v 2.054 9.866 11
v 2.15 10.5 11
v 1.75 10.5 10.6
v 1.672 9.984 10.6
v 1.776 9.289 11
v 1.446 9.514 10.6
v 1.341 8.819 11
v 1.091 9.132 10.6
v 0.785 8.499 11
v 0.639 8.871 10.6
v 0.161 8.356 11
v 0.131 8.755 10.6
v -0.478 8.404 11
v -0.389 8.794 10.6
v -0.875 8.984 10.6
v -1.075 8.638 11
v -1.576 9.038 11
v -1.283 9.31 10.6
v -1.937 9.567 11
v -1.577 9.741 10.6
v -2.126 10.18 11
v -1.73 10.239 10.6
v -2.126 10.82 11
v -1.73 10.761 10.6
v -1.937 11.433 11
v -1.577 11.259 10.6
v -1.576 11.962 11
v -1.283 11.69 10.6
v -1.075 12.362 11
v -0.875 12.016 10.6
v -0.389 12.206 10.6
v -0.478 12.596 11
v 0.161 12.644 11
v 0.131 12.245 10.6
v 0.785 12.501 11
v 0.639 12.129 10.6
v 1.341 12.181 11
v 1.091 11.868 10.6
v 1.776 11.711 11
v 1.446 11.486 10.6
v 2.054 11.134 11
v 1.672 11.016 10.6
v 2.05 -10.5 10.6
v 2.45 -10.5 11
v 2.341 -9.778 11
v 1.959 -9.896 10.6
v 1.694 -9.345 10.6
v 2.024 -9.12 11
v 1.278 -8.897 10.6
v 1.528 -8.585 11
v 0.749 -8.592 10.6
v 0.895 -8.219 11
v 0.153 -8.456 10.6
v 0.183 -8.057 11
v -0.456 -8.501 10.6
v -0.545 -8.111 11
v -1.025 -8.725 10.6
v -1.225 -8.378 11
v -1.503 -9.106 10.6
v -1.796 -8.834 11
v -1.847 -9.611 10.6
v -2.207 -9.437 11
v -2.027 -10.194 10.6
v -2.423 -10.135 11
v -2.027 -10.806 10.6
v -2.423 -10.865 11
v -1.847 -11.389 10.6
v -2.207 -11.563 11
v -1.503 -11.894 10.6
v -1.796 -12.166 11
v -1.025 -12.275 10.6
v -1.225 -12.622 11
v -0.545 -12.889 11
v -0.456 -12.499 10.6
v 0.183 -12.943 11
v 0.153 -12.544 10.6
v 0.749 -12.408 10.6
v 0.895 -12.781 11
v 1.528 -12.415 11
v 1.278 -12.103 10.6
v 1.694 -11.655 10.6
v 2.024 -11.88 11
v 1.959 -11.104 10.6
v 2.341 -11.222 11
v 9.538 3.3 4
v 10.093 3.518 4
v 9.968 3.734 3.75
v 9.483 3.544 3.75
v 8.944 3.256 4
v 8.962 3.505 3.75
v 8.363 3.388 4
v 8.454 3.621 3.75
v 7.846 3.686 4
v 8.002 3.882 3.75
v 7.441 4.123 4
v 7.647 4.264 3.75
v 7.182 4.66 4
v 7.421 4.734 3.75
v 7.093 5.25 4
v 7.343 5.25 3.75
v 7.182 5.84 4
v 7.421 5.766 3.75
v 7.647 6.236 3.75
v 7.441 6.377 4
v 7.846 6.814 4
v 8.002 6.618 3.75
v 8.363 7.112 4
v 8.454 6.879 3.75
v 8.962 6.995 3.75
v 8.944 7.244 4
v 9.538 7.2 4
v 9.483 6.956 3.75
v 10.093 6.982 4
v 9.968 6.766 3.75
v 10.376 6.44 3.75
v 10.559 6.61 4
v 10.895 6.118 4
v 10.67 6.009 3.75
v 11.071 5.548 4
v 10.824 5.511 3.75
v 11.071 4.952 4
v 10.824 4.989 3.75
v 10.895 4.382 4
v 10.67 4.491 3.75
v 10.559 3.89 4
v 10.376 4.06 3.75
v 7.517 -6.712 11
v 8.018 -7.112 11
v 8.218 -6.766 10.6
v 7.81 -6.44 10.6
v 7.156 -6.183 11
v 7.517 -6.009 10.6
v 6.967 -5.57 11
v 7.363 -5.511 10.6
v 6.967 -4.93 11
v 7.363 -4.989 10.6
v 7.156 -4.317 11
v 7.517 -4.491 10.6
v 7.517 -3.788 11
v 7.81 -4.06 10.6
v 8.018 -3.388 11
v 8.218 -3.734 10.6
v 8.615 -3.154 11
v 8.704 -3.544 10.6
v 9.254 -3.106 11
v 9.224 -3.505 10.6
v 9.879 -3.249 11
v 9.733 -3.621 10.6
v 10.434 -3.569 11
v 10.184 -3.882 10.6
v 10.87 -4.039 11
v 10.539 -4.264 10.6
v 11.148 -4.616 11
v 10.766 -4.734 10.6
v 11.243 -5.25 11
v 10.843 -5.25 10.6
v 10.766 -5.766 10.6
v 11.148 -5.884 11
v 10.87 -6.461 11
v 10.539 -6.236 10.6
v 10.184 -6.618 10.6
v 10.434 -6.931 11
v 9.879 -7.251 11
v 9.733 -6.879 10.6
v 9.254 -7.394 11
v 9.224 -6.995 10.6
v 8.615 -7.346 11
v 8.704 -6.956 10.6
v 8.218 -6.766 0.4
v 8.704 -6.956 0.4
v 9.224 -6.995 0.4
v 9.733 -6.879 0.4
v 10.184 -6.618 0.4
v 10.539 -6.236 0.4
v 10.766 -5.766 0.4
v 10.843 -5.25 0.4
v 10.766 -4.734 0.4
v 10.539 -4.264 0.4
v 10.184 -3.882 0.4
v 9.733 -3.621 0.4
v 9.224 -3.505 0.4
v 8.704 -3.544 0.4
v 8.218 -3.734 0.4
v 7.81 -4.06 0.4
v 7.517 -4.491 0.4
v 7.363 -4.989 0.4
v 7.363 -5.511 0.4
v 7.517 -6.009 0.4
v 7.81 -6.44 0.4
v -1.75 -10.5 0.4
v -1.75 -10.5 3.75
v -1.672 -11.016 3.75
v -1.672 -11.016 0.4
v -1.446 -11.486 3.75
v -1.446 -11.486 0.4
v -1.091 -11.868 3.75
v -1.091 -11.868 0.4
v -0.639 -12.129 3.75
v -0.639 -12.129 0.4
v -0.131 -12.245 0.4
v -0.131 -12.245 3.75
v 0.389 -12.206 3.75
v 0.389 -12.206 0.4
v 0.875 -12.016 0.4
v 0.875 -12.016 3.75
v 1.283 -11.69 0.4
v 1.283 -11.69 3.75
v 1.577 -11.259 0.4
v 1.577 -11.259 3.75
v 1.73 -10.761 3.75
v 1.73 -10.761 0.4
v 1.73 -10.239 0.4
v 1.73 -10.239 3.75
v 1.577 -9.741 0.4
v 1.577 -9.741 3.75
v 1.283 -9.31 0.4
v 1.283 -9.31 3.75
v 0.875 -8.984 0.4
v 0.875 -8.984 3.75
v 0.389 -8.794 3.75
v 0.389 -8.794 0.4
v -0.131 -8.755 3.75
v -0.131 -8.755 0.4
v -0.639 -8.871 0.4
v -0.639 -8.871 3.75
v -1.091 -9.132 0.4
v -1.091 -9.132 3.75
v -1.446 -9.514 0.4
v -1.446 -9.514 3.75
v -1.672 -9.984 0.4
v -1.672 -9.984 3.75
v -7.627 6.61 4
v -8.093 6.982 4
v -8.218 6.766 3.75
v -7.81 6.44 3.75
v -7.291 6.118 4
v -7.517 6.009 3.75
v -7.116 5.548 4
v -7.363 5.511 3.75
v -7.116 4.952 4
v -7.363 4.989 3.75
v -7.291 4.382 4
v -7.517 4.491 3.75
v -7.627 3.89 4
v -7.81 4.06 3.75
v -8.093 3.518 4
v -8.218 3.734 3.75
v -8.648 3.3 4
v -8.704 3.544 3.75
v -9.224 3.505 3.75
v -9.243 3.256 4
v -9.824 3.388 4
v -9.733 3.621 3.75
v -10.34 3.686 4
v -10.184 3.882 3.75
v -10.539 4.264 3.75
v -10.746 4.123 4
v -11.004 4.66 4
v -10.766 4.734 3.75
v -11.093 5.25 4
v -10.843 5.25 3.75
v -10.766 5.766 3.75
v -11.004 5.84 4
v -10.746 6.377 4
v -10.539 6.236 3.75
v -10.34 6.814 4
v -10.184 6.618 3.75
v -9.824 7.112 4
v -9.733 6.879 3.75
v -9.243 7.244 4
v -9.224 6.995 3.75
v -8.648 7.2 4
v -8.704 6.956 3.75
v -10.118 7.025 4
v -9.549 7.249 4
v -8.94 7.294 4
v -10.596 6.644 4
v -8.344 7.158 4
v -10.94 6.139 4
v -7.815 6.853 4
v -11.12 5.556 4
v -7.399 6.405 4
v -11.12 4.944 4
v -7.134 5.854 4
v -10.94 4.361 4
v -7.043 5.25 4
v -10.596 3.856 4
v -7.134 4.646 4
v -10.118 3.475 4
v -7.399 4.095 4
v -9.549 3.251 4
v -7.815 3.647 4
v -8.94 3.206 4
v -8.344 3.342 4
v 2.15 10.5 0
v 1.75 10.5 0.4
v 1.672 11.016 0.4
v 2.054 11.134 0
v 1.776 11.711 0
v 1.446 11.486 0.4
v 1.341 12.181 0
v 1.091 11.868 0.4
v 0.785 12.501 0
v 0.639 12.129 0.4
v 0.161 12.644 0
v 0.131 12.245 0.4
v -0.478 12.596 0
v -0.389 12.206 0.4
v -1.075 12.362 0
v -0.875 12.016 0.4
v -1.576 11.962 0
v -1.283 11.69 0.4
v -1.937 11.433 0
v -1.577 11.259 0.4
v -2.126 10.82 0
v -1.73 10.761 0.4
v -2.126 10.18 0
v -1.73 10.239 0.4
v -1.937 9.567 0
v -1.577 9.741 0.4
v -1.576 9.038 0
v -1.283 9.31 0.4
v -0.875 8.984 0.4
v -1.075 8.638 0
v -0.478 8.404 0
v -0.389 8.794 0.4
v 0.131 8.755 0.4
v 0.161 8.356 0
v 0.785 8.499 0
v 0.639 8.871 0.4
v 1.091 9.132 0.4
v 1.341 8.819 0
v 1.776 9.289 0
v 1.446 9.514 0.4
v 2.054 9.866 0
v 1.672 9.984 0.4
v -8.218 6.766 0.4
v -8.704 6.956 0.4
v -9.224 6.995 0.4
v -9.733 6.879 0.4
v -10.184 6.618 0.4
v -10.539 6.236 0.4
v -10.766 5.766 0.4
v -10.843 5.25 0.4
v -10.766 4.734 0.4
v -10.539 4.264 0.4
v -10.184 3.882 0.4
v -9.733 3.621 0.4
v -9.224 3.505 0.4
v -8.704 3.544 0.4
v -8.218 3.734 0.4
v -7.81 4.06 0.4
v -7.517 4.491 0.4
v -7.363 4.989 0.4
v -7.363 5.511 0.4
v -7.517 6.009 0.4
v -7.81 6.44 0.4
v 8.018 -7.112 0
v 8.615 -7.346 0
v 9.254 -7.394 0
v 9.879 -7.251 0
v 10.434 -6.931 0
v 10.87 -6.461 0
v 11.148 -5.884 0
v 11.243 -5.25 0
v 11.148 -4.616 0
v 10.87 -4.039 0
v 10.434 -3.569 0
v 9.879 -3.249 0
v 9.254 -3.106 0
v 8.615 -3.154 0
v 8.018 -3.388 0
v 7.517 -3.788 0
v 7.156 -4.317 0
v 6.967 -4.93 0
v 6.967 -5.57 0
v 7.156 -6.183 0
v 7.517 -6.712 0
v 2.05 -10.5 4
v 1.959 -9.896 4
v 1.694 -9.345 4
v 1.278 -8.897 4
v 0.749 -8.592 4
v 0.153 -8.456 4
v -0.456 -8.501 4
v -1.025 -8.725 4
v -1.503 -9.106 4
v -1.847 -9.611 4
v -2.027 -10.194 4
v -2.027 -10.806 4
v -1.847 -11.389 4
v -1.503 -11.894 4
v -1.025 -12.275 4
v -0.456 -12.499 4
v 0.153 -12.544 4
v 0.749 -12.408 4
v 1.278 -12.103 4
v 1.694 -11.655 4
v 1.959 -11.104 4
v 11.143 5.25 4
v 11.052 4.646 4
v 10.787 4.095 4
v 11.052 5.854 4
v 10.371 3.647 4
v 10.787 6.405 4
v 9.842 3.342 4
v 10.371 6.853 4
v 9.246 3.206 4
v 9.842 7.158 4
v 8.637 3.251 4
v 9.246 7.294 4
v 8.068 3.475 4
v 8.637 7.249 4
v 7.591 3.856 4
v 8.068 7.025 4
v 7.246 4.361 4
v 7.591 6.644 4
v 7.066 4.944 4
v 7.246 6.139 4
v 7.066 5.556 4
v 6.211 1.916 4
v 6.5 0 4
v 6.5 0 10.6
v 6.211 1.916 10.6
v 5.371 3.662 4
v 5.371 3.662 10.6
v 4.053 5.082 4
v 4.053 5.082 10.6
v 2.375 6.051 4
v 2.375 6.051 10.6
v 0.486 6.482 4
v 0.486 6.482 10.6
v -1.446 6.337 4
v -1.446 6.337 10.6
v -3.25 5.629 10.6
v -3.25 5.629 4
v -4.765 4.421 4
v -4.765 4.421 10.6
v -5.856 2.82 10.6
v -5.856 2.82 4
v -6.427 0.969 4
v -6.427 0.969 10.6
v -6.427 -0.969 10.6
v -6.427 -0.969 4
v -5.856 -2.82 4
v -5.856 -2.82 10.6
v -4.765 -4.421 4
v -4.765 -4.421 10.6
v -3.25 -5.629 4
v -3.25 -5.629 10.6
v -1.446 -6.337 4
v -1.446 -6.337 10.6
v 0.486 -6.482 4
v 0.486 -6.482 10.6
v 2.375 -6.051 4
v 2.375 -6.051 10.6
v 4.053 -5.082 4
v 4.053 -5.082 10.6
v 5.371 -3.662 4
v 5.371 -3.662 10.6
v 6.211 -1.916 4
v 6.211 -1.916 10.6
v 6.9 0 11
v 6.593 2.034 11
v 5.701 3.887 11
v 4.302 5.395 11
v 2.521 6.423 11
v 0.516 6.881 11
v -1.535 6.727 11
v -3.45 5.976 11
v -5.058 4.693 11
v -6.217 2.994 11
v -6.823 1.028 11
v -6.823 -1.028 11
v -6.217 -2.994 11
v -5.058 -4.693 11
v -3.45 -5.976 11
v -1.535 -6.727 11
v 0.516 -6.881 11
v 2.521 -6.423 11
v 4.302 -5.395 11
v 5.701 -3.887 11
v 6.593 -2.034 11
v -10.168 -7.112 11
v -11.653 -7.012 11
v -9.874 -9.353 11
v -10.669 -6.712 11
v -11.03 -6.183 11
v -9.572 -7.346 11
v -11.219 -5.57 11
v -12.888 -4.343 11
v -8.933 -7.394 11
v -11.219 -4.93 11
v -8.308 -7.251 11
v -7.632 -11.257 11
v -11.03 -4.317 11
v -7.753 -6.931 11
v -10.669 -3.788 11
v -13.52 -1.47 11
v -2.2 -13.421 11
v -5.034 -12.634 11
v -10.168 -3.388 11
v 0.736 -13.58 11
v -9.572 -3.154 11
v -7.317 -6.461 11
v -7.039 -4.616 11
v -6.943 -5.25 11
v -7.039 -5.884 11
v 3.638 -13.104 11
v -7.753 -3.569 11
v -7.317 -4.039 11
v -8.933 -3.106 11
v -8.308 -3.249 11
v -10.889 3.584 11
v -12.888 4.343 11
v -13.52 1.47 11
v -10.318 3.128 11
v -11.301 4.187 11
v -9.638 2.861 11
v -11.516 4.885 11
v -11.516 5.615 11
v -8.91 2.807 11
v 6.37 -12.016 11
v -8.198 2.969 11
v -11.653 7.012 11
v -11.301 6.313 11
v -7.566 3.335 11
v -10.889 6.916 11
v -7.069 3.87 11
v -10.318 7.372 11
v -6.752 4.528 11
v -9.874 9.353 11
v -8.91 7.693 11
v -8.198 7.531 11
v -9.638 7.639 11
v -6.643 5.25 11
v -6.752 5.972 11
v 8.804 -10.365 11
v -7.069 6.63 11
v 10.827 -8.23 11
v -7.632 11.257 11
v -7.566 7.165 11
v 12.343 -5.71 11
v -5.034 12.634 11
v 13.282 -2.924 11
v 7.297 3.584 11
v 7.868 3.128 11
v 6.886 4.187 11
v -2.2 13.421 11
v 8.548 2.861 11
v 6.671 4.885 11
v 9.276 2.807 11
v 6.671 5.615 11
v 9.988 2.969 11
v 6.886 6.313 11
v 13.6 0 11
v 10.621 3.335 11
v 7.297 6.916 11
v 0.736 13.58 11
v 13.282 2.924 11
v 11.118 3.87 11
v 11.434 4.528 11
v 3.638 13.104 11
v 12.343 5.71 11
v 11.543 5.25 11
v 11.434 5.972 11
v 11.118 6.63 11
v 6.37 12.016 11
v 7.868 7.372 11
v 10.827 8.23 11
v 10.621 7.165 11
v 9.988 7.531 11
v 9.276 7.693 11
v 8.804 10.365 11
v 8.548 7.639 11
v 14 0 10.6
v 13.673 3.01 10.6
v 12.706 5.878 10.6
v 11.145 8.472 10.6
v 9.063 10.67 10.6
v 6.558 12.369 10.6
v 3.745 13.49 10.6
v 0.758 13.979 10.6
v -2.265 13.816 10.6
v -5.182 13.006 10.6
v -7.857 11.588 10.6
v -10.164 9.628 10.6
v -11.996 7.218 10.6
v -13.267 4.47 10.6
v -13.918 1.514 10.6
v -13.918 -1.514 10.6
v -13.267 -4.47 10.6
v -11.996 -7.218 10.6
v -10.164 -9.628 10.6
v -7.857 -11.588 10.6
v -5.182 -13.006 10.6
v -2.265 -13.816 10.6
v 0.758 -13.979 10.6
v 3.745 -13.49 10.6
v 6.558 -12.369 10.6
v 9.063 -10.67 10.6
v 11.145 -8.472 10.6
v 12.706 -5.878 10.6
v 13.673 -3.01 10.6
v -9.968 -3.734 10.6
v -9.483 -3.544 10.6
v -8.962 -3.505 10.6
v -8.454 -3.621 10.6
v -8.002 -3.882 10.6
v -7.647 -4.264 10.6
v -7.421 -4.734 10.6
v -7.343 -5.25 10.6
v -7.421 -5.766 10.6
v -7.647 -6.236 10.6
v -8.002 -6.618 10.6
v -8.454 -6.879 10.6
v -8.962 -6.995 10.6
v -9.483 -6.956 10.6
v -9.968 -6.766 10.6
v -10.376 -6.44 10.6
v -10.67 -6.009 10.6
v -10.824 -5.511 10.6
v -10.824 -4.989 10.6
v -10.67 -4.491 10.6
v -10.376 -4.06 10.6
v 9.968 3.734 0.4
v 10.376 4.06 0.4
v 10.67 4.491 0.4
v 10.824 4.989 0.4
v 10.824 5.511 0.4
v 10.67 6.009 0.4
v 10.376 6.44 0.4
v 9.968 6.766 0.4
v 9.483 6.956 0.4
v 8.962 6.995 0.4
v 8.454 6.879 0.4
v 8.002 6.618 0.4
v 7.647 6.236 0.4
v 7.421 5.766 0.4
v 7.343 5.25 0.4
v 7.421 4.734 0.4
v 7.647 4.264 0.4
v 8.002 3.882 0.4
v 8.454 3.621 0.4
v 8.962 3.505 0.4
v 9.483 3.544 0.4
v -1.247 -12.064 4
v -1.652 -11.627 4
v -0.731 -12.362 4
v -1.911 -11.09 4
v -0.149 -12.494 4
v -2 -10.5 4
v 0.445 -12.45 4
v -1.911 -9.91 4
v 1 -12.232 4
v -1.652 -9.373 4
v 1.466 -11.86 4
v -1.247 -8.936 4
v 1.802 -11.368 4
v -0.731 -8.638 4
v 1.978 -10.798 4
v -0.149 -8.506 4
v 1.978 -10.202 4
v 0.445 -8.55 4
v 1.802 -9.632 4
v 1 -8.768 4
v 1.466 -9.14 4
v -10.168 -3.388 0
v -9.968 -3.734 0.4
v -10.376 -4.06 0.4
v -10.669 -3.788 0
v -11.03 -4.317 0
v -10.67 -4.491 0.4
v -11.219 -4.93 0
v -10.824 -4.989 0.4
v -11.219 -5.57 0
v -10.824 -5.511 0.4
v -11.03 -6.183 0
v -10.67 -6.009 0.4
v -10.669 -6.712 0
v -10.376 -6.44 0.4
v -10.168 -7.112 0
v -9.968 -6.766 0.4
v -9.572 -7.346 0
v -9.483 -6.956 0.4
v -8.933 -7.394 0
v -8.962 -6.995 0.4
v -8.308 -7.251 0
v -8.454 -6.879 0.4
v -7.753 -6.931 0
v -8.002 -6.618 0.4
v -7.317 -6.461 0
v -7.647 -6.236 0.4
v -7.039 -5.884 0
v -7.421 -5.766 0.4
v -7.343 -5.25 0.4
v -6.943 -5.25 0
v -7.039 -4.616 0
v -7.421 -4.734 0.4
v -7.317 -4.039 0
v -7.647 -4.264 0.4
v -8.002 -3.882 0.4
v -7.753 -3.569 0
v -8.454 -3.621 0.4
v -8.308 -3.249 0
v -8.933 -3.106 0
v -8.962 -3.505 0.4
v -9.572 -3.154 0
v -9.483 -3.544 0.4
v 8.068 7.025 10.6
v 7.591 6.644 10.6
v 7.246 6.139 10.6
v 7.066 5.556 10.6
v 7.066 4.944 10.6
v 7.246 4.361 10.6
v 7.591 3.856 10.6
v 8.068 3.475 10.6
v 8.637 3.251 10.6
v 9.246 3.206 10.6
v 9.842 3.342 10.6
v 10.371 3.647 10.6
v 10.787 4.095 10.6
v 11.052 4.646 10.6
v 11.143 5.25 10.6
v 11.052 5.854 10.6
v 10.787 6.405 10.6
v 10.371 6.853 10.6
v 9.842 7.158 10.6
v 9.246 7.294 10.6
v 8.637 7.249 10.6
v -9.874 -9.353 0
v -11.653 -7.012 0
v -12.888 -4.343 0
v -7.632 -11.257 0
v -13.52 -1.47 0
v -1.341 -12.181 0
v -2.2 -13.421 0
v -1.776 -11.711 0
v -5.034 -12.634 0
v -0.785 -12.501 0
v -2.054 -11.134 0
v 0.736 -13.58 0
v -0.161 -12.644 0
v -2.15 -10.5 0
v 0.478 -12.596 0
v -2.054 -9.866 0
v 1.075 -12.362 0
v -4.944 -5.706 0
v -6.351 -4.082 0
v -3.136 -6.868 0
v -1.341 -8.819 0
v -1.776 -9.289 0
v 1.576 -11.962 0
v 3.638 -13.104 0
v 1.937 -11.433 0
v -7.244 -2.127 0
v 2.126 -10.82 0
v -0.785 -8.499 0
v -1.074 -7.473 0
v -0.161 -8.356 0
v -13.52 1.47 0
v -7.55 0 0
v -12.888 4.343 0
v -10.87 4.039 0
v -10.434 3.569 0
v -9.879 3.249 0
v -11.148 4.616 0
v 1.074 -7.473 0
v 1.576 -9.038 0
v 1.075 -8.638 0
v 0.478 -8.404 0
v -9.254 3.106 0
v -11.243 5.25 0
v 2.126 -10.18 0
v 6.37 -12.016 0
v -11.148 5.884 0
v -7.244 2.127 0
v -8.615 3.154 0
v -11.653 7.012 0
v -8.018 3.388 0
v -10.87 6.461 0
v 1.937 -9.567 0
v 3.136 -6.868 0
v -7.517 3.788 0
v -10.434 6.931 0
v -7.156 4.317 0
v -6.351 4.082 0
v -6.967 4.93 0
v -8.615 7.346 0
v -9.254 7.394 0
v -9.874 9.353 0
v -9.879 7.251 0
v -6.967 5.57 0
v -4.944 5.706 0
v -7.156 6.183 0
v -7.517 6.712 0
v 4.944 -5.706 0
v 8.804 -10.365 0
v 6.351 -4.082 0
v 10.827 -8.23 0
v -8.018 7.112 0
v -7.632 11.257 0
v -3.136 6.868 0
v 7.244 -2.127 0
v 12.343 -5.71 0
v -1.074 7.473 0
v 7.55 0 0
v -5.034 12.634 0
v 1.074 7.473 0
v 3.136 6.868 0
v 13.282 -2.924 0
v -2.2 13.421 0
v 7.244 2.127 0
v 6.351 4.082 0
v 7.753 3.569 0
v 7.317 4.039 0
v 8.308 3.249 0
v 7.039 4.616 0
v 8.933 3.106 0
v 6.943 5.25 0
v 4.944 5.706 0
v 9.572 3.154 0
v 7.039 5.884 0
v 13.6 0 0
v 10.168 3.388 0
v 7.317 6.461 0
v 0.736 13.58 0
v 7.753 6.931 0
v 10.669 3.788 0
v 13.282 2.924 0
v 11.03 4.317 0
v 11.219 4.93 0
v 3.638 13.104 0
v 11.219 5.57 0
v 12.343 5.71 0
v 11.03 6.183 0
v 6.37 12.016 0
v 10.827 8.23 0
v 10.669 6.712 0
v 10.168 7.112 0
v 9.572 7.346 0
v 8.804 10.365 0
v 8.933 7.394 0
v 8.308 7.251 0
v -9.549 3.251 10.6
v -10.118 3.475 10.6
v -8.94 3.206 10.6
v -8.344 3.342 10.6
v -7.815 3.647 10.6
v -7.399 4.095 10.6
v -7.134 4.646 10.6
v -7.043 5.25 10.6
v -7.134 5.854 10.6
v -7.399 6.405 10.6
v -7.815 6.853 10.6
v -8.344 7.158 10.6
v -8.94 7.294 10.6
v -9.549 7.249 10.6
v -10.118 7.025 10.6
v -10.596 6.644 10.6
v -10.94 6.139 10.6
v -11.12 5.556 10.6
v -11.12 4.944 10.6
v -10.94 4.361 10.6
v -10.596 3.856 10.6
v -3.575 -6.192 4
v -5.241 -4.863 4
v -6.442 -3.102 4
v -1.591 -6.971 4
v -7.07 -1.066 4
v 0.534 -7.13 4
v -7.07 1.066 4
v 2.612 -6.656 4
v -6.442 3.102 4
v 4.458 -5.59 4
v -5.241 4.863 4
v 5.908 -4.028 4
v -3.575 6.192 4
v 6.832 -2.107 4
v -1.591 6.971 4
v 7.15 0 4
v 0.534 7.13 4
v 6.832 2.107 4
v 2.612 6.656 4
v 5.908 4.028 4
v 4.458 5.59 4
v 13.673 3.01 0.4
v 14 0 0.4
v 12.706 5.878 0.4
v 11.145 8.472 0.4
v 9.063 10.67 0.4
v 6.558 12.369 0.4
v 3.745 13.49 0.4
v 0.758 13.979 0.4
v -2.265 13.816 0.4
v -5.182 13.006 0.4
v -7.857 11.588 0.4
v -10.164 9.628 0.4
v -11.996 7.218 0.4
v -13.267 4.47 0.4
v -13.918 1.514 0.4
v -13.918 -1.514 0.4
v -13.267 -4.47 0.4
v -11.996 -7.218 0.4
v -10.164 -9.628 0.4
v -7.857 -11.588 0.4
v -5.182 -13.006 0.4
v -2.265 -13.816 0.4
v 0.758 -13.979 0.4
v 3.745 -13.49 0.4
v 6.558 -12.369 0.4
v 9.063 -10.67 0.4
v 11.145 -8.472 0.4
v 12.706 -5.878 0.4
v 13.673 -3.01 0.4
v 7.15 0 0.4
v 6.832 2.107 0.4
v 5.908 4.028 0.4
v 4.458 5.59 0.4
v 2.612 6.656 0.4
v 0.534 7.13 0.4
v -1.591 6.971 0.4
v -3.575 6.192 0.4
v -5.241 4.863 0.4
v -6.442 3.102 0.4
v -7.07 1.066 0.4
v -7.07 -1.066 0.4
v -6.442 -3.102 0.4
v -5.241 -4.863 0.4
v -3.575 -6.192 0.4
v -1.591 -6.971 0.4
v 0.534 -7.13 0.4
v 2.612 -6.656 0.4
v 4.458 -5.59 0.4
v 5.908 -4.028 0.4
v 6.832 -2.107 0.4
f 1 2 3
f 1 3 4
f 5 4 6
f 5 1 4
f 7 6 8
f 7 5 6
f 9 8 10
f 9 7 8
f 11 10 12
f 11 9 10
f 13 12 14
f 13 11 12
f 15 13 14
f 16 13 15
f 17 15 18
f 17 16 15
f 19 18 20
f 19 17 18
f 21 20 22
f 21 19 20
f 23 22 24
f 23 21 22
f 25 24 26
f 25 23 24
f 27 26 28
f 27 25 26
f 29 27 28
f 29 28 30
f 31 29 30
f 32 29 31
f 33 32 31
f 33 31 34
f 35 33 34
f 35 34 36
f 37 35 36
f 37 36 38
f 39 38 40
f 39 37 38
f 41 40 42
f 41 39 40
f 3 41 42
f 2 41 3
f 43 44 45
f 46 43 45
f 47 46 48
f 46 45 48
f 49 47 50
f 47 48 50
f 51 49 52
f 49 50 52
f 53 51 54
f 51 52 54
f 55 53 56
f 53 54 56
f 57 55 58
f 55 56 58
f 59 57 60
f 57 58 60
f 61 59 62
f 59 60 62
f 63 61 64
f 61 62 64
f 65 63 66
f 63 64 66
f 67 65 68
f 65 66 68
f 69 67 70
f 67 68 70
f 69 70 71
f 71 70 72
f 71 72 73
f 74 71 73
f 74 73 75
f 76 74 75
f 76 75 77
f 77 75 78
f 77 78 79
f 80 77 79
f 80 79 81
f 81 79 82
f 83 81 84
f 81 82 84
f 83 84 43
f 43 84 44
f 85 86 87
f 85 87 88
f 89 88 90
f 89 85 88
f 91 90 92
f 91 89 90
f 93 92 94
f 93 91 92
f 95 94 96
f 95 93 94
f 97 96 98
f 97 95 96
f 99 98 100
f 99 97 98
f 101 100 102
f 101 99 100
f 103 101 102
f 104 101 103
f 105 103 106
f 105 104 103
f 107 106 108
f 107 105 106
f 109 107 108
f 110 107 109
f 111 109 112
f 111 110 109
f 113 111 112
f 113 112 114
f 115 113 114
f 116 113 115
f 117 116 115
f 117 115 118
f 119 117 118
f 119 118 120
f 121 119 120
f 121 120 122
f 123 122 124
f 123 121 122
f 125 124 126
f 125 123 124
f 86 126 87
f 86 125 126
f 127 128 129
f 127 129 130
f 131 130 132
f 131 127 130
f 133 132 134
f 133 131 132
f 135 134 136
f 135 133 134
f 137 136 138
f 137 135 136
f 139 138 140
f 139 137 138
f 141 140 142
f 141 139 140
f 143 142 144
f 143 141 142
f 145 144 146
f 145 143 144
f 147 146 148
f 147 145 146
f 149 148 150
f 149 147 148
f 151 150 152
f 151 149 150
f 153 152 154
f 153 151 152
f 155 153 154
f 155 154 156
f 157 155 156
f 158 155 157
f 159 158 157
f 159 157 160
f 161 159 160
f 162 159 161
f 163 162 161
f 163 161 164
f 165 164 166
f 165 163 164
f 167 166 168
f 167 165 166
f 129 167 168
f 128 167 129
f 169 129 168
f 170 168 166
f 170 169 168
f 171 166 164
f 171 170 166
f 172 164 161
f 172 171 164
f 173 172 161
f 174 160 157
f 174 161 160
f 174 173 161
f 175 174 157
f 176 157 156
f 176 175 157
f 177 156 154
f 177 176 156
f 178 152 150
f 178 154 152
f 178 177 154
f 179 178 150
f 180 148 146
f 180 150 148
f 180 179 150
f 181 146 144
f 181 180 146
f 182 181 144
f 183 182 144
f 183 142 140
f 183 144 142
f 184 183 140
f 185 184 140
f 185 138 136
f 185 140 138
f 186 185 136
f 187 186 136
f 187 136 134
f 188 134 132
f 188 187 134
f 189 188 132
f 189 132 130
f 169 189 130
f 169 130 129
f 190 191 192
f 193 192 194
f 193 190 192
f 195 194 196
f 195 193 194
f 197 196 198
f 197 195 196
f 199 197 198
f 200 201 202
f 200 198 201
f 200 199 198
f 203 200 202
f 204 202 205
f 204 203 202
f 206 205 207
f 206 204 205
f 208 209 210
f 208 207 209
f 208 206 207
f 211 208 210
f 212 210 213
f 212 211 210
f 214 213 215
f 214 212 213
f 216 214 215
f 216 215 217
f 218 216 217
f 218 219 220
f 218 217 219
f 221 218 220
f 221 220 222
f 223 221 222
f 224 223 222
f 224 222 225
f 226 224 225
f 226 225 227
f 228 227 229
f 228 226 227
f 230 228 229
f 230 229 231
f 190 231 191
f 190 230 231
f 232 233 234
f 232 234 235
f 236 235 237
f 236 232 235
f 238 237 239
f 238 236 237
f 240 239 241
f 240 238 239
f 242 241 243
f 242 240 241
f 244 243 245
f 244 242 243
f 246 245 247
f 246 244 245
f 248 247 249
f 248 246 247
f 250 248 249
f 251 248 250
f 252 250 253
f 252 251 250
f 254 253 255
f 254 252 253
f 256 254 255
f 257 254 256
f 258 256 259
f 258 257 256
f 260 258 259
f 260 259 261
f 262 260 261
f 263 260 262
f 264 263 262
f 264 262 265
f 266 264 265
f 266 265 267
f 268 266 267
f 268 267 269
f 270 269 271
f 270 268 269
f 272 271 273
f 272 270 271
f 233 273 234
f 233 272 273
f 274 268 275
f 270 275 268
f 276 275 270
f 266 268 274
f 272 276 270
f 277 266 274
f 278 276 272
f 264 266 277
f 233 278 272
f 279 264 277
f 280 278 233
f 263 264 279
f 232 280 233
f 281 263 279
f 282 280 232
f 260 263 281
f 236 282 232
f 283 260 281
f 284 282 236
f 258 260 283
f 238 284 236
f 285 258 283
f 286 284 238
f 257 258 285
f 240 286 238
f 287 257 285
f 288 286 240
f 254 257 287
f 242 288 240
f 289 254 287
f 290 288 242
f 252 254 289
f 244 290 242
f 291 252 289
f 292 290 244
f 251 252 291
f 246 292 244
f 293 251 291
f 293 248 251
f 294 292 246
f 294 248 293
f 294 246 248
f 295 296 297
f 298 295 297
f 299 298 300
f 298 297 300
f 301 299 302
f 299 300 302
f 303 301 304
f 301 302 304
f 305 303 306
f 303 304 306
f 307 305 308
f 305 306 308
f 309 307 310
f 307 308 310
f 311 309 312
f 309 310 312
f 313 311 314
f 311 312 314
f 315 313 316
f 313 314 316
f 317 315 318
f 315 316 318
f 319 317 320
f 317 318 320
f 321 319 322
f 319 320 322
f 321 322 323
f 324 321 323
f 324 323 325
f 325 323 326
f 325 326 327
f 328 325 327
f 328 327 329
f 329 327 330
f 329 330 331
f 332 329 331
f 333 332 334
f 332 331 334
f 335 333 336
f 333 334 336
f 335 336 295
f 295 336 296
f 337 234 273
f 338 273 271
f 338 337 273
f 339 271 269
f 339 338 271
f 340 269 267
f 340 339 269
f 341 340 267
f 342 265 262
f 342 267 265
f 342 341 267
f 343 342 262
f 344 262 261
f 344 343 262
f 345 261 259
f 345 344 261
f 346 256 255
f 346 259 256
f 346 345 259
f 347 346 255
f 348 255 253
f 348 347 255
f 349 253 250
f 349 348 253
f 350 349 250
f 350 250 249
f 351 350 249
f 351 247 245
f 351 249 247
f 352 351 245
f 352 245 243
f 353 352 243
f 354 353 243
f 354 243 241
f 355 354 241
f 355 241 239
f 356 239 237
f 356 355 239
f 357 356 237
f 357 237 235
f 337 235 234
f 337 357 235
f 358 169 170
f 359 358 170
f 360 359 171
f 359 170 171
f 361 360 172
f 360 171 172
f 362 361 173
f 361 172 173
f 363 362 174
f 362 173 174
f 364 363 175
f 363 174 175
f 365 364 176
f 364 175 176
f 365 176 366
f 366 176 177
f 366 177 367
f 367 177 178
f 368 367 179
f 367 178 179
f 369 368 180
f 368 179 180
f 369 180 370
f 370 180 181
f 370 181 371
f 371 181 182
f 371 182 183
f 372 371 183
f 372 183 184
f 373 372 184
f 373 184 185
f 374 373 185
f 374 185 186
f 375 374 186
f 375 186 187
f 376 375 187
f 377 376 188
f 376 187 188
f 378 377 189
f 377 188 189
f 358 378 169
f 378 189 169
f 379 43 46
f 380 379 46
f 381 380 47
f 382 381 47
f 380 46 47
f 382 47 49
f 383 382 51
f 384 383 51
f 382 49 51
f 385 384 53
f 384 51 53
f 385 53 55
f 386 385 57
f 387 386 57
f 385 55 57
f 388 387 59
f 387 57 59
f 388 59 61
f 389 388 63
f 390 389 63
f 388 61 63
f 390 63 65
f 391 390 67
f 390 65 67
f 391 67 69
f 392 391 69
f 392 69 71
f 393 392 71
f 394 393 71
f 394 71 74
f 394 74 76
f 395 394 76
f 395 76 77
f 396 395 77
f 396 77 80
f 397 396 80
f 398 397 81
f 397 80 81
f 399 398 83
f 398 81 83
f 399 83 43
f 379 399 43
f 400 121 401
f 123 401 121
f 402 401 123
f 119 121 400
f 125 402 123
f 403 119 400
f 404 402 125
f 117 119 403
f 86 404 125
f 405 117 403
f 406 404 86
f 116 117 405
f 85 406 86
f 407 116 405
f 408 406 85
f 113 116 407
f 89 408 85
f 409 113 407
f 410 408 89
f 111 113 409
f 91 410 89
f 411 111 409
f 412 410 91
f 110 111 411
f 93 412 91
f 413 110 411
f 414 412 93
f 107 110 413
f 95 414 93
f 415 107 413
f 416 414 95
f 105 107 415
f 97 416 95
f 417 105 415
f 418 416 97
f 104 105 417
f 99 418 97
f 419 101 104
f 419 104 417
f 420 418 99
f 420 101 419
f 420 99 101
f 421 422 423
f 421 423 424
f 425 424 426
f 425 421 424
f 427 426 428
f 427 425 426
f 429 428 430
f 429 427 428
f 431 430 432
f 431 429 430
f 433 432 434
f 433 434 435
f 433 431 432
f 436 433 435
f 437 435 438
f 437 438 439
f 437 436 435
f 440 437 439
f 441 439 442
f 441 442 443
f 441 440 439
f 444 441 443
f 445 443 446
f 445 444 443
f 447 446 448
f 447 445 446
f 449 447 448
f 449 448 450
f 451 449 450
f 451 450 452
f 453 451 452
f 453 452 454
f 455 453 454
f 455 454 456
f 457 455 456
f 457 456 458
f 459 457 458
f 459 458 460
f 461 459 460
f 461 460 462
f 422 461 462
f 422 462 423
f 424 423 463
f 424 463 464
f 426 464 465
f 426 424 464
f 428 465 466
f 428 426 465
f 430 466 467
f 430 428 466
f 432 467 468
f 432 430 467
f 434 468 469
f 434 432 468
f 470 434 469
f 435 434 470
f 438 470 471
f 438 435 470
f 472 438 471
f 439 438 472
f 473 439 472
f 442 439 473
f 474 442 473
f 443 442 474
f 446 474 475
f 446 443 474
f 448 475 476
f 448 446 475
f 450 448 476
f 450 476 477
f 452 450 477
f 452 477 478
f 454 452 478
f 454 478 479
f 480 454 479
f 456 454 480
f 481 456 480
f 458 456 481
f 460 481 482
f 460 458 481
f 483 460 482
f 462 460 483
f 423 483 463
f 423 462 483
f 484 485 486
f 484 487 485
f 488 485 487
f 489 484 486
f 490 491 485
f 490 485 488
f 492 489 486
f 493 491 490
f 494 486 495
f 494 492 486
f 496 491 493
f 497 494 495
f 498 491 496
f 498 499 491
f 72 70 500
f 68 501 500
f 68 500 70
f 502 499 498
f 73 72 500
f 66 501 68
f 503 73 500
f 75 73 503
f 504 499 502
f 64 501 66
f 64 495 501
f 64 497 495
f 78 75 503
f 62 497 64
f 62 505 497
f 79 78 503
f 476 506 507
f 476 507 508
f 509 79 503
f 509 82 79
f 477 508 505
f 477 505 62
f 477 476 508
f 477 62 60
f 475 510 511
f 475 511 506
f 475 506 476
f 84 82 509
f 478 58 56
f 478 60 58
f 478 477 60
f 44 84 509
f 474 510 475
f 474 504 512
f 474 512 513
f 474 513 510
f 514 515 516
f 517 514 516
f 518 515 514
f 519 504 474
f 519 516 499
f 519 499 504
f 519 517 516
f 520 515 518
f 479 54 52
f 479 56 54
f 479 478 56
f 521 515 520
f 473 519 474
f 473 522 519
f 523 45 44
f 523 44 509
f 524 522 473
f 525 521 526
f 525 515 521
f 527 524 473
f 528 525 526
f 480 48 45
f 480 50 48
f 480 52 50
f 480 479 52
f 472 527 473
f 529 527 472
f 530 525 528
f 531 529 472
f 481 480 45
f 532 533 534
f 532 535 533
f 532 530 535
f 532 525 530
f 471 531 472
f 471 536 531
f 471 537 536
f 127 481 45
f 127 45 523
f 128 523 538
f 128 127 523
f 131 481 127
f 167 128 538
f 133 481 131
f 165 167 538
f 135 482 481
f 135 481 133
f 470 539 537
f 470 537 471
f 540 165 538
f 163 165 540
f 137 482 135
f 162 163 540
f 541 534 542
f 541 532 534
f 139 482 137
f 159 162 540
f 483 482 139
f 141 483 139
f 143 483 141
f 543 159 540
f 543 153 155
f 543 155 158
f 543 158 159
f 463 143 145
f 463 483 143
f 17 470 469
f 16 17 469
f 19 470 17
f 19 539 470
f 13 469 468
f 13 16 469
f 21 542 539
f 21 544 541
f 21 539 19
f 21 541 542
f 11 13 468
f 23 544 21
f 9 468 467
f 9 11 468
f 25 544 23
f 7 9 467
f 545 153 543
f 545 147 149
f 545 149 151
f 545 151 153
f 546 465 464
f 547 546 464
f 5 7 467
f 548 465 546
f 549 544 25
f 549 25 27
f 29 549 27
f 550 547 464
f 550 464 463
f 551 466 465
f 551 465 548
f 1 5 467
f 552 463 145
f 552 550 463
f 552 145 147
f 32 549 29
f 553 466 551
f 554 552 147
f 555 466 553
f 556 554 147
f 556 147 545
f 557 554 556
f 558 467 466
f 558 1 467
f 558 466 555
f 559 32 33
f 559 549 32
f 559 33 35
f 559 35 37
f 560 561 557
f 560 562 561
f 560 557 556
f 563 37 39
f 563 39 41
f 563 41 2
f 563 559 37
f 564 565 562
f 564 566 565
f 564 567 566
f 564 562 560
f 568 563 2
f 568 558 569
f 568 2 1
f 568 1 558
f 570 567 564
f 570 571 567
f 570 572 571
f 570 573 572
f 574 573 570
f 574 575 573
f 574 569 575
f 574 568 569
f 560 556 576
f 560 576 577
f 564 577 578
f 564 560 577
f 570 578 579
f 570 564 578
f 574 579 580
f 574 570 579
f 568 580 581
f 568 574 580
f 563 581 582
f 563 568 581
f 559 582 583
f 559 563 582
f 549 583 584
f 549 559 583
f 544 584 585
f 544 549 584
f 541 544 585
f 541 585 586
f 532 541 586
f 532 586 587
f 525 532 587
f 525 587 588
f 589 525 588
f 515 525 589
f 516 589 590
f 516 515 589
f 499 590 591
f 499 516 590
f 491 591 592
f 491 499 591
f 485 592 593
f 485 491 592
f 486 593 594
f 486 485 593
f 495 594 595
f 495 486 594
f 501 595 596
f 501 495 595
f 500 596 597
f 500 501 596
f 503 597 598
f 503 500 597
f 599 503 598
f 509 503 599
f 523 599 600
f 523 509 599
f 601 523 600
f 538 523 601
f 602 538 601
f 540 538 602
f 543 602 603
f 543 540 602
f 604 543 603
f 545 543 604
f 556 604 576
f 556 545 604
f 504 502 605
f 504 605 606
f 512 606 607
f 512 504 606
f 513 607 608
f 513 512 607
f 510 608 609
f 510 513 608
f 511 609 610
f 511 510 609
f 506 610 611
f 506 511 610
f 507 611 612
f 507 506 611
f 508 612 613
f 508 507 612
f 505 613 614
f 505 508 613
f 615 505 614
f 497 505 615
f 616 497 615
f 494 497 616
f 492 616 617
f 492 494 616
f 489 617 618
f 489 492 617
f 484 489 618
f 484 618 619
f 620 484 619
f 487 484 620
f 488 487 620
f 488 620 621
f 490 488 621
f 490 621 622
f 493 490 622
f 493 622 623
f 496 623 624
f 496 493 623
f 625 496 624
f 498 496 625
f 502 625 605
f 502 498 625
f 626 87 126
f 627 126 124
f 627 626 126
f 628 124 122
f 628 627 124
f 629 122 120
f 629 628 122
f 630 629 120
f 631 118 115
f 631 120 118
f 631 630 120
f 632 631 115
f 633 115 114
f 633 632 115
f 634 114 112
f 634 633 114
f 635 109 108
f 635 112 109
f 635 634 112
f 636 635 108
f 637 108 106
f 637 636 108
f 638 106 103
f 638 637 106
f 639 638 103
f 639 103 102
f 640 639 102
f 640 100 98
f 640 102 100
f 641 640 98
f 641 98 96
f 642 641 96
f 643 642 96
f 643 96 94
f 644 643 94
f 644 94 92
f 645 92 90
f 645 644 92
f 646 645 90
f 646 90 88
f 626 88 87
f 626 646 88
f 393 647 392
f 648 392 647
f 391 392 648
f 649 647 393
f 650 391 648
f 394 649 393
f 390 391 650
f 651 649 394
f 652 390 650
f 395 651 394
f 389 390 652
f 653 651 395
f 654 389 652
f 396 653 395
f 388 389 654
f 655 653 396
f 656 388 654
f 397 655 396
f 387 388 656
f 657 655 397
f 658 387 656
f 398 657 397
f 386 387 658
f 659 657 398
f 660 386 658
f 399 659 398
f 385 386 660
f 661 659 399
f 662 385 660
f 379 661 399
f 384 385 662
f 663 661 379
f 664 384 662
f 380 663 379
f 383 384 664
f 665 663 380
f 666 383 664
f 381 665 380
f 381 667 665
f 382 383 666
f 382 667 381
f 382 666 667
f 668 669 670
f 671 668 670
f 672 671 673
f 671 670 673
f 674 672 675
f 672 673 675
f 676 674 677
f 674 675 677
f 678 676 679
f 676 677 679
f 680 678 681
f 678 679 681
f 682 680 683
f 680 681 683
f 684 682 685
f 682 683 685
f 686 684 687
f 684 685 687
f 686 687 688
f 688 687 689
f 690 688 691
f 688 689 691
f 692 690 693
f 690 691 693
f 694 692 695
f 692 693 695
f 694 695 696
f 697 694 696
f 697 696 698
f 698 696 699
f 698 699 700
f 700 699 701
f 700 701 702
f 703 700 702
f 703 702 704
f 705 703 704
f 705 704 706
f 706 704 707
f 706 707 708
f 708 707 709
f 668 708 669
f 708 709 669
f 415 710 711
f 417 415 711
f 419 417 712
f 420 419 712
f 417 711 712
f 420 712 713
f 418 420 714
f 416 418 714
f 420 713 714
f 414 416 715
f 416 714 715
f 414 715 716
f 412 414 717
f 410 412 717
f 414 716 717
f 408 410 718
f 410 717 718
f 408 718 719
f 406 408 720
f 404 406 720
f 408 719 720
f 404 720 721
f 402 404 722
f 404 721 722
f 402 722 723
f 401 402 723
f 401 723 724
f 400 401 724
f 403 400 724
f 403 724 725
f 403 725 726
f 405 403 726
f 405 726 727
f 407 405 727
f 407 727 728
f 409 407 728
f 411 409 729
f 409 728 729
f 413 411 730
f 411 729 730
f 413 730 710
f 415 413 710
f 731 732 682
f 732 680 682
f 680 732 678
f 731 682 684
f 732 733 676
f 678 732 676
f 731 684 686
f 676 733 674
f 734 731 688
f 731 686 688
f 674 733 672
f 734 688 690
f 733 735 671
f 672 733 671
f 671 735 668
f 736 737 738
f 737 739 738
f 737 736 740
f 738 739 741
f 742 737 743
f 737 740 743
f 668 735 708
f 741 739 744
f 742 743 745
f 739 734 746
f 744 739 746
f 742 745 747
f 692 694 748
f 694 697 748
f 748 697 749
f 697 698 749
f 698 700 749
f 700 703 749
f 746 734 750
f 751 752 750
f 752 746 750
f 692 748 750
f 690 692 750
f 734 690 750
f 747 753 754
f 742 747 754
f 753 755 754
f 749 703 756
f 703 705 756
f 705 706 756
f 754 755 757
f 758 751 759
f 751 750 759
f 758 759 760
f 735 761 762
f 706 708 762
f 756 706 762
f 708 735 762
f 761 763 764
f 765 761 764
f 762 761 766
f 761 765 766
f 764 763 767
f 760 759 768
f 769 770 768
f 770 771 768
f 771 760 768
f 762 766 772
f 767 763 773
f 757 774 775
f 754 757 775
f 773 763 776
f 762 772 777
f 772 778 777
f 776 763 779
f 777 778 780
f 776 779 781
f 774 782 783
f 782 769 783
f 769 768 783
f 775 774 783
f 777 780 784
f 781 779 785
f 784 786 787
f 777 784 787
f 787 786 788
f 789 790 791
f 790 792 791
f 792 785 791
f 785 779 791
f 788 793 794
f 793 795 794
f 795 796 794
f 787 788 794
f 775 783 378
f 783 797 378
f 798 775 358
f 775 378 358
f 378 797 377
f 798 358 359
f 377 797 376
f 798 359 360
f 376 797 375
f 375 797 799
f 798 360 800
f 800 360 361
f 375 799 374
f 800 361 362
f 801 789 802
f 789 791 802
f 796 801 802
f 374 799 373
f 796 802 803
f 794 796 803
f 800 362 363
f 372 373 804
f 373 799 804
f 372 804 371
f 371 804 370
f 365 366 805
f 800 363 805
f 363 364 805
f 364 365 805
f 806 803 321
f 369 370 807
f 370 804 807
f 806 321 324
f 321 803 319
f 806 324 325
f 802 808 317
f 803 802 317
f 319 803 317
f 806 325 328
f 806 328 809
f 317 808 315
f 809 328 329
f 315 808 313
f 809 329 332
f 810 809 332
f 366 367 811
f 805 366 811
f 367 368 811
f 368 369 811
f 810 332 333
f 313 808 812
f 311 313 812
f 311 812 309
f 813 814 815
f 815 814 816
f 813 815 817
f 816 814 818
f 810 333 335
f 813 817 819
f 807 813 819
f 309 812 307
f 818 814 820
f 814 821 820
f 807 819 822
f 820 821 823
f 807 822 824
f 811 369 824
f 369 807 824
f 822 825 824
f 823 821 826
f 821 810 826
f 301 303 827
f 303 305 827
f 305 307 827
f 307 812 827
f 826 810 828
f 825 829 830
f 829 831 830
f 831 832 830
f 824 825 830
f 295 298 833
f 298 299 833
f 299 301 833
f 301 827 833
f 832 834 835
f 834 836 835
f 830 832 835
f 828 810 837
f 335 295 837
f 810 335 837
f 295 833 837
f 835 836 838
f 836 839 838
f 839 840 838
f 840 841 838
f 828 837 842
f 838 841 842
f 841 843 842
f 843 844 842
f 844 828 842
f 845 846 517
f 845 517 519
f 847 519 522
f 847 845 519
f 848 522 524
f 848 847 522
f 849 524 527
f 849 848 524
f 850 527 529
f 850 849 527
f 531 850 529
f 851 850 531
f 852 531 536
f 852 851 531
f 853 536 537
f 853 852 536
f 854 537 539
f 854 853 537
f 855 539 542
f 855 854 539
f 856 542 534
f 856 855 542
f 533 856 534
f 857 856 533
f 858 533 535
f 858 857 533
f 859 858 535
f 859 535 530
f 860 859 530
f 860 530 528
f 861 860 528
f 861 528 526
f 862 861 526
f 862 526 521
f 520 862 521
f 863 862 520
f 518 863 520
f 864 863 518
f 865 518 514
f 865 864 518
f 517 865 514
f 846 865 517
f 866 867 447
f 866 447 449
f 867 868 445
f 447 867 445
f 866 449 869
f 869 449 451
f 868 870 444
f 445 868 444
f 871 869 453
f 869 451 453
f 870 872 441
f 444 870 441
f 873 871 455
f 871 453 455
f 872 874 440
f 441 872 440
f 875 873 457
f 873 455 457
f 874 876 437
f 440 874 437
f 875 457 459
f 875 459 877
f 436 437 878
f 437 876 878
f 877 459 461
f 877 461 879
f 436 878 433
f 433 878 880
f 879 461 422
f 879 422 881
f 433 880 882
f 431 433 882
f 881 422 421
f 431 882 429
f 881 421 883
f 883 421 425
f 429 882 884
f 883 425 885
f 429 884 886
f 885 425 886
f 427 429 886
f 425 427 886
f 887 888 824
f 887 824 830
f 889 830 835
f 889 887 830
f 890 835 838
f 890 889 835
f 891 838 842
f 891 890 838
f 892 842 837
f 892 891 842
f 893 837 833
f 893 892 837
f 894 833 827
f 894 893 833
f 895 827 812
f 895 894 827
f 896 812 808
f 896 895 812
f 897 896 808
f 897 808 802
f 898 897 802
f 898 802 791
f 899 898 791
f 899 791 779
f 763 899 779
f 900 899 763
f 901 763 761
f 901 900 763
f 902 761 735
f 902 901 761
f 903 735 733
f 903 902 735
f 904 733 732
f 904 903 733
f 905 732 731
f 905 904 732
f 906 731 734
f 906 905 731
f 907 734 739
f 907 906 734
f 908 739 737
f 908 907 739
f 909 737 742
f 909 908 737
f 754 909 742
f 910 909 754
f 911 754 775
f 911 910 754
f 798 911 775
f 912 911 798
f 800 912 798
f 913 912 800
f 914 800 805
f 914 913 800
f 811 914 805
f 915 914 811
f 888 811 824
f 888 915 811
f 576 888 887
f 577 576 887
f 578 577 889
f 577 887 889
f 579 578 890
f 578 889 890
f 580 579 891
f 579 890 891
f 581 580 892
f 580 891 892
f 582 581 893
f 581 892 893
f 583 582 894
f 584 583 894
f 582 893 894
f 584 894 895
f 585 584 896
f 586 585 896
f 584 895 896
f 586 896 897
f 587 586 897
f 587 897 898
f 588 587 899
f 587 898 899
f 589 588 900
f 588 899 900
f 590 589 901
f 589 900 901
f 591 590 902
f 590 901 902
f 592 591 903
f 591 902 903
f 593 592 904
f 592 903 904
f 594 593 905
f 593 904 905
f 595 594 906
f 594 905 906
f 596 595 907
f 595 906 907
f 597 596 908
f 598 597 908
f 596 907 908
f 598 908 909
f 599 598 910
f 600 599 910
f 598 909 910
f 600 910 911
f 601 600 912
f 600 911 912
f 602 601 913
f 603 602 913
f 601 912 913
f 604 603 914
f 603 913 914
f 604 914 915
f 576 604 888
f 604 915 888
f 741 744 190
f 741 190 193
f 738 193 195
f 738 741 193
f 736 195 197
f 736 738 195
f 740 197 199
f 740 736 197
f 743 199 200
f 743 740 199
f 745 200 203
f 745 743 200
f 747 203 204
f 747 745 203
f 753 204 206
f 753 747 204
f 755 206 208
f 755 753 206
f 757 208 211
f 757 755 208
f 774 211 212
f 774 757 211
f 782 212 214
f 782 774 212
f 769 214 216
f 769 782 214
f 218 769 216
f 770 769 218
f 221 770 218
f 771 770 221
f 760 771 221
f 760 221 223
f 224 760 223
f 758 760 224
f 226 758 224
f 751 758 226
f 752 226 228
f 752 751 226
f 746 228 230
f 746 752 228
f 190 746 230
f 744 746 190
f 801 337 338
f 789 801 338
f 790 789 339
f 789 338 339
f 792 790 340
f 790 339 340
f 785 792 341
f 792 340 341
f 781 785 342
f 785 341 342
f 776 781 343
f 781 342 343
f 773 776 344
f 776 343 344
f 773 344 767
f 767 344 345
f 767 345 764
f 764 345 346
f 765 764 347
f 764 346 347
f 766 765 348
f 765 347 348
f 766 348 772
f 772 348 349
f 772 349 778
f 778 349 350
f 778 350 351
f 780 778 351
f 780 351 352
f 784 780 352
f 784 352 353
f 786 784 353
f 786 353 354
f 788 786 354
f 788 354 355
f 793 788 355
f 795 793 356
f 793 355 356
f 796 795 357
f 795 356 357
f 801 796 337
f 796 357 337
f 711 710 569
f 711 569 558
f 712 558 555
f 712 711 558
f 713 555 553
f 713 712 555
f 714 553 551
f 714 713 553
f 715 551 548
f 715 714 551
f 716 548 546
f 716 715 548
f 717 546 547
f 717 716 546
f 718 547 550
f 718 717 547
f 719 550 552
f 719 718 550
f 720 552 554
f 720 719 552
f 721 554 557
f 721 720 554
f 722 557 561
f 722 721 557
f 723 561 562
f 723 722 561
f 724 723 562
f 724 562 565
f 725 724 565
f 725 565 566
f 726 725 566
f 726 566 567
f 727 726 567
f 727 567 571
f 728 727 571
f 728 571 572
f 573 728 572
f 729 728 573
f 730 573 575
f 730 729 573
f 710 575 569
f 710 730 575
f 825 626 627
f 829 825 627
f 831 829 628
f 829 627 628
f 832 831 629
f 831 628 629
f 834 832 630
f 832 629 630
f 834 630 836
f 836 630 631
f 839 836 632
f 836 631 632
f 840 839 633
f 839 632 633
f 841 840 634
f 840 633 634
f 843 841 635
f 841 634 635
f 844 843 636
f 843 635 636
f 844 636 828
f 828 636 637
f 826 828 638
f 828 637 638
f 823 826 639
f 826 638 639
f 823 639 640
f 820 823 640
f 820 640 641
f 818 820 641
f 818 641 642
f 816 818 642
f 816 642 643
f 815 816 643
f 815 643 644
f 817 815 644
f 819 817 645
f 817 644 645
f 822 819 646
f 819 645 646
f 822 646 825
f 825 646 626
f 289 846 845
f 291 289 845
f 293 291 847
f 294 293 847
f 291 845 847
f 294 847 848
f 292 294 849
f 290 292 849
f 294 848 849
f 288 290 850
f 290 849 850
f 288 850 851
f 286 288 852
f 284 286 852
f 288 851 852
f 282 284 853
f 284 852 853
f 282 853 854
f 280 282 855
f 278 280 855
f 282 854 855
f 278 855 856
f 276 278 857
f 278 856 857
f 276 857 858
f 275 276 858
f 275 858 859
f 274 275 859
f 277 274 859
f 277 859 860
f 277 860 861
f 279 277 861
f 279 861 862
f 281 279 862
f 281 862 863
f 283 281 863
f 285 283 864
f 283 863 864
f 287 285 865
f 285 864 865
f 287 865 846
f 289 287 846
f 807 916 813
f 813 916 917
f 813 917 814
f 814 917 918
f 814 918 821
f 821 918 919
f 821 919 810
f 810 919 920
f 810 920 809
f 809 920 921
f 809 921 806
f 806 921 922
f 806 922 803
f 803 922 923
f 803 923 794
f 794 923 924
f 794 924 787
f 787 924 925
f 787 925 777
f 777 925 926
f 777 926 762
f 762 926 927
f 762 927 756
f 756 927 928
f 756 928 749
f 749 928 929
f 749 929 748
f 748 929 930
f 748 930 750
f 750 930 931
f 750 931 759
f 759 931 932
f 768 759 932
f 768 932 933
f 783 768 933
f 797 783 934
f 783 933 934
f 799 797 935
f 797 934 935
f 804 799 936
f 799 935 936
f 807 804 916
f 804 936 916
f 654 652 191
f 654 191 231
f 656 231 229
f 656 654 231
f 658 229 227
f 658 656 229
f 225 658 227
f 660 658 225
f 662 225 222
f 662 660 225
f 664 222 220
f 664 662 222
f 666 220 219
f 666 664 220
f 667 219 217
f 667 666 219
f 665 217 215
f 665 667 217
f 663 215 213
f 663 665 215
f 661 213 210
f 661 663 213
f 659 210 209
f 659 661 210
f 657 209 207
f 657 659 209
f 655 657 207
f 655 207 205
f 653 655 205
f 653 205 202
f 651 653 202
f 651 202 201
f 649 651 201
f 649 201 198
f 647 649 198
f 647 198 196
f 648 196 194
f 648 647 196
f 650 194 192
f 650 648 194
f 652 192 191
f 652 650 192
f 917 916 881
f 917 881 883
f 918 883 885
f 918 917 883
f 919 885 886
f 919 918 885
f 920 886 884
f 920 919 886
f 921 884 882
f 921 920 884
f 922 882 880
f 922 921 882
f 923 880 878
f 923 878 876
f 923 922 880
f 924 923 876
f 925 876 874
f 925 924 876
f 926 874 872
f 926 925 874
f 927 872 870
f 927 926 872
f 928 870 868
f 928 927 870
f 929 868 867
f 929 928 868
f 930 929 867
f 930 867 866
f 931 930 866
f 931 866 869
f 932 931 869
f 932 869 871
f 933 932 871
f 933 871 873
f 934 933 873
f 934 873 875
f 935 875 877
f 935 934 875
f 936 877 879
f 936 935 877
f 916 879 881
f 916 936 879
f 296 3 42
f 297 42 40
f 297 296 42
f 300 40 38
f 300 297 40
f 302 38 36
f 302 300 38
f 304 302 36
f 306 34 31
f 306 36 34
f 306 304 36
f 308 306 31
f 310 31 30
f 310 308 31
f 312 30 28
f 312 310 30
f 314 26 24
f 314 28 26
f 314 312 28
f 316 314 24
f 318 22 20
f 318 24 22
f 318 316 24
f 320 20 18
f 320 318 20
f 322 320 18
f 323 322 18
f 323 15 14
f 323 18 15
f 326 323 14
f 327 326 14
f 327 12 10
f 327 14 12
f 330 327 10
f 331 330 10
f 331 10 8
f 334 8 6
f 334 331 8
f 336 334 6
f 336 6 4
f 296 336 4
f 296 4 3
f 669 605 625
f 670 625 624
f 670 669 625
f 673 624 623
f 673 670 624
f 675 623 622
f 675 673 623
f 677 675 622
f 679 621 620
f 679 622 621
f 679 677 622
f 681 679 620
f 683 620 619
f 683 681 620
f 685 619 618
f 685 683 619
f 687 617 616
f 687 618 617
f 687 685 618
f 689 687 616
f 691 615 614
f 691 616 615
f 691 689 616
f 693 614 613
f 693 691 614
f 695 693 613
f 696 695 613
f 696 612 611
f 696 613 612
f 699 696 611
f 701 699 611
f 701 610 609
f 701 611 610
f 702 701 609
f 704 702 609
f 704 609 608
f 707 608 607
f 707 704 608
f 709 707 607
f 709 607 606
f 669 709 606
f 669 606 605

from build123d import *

# Parameters (mm, degrees)
SKETCH101_R           = 14
SKETCH101_R_2         = 6.5
PAD060_DEPTH          = 11
SKETCH102_R           = 7.15
POCKET039_DEPTH       = 4
SKETCH103_R           = 1.75
POCKET040_DEPTH       = 93.19589
POLARPATTERN021_COUNT = 6
SKETCH104_R           = 2.05
POCKET041_DEPTH       = 7
POLARPATTERN022_COUNT = 3
CHAMFER037_SIZE       = 0.25
CHAMFER036_SIZE       = 0.4


with BuildPart() as part:
    # Sketch101 → Pad060 (new body)
    with BuildSketch(Plane.XY):
        Circle(SKETCH101_R)
        Circle(SKETCH101_R_2, mode=Mode.SUBTRACT)
    extrude(amount=PAD060_DEPTH)

    # Sketch102 → Pocket039 (cut)
    with BuildSketch(Plane.XY):
        Circle(SKETCH102_R)
    extrude(amount=POCKET039_DEPTH, mode=Mode.SUBTRACT)

    # Sketch103 → Pocket040 (cut, through all)
    with BuildSketch(Plane.XY):
        with Locations((0, 10.5)):
            Circle(SKETCH103_R)
    pocket040 = extrude(amount=POCKET040_DEPTH, mode=Mode.SUBTRACT)

    # PolarPattern021: Pocket040 ×6 about axis
    polarpattern021_axis = Axis((0, 0, 0), (0, 0, 1))
    for i in range(1, POLARPATTERN021_COUNT):
        add(pocket040.rotate(polarpattern021_axis, i * 360 / POLARPATTERN021_COUNT), mode=Mode.SUBTRACT)

    # Sketch104 (on Plane of DatumPlane006) → Pocket041 (cut)
    with BuildSketch(Plane.XY.offset(11)):
        with Locations((0, -10.5)):
            Circle(SKETCH104_R)
    pocket041 = extrude(amount=-POCKET041_DEPTH, mode=Mode.SUBTRACT)

    # PolarPattern022: Pocket041 ×3 about axis
    polarpattern022_axis = Axis((0, 0, 11), (0, 0, 1))
    for i in range(1, POLARPATTERN022_COUNT):
        add(pocket041.rotate(polarpattern022_axis, i * 360 / POLARPATTERN022_COUNT), mode=Mode.SUBTRACT)

    # Chamfer037
    chamfer037_edges = [part.edges().sort_by_distance(p)[0] for p in [
        (1.75, -10.5, 4),
        (8.218267, 6.765544, 4),
        (-9.968267, 3.734456, 4),
    ]]
    chamfer(chamfer037_edges, length=CHAMFER037_SIZE)

    # Chamfer036
    chamfer036_edges = [part.edges().sort_by_distance(p)[0] for p in [
        (-14, 0, 11),
        (-8.218267, -6.765544, 11),
        (-2.05, -10.5, 11),
        (9.968267, -3.734456, 11),
        (-8.068267, 7.025352, 11),
        (-6.5, 0, 11),
        (10.118267, 3.474648, 11),
        (-1.75, 10.5, 11),
        (-14, 0, 0),
        (1.75, -10.5, 0),
        (-8.218267, -6.765544, 0),
        (-7.15, 0, 0),
        (9.968267, -3.734456, 0),
        (-9.968267, 3.734456, 0),
        (-1.75, 10.5, 0),
        (8.218267, 6.765544, 0),
    ]]
    chamfer(chamfer036_edges, length=CHAMFER036_SIZE)


solid = part.part
